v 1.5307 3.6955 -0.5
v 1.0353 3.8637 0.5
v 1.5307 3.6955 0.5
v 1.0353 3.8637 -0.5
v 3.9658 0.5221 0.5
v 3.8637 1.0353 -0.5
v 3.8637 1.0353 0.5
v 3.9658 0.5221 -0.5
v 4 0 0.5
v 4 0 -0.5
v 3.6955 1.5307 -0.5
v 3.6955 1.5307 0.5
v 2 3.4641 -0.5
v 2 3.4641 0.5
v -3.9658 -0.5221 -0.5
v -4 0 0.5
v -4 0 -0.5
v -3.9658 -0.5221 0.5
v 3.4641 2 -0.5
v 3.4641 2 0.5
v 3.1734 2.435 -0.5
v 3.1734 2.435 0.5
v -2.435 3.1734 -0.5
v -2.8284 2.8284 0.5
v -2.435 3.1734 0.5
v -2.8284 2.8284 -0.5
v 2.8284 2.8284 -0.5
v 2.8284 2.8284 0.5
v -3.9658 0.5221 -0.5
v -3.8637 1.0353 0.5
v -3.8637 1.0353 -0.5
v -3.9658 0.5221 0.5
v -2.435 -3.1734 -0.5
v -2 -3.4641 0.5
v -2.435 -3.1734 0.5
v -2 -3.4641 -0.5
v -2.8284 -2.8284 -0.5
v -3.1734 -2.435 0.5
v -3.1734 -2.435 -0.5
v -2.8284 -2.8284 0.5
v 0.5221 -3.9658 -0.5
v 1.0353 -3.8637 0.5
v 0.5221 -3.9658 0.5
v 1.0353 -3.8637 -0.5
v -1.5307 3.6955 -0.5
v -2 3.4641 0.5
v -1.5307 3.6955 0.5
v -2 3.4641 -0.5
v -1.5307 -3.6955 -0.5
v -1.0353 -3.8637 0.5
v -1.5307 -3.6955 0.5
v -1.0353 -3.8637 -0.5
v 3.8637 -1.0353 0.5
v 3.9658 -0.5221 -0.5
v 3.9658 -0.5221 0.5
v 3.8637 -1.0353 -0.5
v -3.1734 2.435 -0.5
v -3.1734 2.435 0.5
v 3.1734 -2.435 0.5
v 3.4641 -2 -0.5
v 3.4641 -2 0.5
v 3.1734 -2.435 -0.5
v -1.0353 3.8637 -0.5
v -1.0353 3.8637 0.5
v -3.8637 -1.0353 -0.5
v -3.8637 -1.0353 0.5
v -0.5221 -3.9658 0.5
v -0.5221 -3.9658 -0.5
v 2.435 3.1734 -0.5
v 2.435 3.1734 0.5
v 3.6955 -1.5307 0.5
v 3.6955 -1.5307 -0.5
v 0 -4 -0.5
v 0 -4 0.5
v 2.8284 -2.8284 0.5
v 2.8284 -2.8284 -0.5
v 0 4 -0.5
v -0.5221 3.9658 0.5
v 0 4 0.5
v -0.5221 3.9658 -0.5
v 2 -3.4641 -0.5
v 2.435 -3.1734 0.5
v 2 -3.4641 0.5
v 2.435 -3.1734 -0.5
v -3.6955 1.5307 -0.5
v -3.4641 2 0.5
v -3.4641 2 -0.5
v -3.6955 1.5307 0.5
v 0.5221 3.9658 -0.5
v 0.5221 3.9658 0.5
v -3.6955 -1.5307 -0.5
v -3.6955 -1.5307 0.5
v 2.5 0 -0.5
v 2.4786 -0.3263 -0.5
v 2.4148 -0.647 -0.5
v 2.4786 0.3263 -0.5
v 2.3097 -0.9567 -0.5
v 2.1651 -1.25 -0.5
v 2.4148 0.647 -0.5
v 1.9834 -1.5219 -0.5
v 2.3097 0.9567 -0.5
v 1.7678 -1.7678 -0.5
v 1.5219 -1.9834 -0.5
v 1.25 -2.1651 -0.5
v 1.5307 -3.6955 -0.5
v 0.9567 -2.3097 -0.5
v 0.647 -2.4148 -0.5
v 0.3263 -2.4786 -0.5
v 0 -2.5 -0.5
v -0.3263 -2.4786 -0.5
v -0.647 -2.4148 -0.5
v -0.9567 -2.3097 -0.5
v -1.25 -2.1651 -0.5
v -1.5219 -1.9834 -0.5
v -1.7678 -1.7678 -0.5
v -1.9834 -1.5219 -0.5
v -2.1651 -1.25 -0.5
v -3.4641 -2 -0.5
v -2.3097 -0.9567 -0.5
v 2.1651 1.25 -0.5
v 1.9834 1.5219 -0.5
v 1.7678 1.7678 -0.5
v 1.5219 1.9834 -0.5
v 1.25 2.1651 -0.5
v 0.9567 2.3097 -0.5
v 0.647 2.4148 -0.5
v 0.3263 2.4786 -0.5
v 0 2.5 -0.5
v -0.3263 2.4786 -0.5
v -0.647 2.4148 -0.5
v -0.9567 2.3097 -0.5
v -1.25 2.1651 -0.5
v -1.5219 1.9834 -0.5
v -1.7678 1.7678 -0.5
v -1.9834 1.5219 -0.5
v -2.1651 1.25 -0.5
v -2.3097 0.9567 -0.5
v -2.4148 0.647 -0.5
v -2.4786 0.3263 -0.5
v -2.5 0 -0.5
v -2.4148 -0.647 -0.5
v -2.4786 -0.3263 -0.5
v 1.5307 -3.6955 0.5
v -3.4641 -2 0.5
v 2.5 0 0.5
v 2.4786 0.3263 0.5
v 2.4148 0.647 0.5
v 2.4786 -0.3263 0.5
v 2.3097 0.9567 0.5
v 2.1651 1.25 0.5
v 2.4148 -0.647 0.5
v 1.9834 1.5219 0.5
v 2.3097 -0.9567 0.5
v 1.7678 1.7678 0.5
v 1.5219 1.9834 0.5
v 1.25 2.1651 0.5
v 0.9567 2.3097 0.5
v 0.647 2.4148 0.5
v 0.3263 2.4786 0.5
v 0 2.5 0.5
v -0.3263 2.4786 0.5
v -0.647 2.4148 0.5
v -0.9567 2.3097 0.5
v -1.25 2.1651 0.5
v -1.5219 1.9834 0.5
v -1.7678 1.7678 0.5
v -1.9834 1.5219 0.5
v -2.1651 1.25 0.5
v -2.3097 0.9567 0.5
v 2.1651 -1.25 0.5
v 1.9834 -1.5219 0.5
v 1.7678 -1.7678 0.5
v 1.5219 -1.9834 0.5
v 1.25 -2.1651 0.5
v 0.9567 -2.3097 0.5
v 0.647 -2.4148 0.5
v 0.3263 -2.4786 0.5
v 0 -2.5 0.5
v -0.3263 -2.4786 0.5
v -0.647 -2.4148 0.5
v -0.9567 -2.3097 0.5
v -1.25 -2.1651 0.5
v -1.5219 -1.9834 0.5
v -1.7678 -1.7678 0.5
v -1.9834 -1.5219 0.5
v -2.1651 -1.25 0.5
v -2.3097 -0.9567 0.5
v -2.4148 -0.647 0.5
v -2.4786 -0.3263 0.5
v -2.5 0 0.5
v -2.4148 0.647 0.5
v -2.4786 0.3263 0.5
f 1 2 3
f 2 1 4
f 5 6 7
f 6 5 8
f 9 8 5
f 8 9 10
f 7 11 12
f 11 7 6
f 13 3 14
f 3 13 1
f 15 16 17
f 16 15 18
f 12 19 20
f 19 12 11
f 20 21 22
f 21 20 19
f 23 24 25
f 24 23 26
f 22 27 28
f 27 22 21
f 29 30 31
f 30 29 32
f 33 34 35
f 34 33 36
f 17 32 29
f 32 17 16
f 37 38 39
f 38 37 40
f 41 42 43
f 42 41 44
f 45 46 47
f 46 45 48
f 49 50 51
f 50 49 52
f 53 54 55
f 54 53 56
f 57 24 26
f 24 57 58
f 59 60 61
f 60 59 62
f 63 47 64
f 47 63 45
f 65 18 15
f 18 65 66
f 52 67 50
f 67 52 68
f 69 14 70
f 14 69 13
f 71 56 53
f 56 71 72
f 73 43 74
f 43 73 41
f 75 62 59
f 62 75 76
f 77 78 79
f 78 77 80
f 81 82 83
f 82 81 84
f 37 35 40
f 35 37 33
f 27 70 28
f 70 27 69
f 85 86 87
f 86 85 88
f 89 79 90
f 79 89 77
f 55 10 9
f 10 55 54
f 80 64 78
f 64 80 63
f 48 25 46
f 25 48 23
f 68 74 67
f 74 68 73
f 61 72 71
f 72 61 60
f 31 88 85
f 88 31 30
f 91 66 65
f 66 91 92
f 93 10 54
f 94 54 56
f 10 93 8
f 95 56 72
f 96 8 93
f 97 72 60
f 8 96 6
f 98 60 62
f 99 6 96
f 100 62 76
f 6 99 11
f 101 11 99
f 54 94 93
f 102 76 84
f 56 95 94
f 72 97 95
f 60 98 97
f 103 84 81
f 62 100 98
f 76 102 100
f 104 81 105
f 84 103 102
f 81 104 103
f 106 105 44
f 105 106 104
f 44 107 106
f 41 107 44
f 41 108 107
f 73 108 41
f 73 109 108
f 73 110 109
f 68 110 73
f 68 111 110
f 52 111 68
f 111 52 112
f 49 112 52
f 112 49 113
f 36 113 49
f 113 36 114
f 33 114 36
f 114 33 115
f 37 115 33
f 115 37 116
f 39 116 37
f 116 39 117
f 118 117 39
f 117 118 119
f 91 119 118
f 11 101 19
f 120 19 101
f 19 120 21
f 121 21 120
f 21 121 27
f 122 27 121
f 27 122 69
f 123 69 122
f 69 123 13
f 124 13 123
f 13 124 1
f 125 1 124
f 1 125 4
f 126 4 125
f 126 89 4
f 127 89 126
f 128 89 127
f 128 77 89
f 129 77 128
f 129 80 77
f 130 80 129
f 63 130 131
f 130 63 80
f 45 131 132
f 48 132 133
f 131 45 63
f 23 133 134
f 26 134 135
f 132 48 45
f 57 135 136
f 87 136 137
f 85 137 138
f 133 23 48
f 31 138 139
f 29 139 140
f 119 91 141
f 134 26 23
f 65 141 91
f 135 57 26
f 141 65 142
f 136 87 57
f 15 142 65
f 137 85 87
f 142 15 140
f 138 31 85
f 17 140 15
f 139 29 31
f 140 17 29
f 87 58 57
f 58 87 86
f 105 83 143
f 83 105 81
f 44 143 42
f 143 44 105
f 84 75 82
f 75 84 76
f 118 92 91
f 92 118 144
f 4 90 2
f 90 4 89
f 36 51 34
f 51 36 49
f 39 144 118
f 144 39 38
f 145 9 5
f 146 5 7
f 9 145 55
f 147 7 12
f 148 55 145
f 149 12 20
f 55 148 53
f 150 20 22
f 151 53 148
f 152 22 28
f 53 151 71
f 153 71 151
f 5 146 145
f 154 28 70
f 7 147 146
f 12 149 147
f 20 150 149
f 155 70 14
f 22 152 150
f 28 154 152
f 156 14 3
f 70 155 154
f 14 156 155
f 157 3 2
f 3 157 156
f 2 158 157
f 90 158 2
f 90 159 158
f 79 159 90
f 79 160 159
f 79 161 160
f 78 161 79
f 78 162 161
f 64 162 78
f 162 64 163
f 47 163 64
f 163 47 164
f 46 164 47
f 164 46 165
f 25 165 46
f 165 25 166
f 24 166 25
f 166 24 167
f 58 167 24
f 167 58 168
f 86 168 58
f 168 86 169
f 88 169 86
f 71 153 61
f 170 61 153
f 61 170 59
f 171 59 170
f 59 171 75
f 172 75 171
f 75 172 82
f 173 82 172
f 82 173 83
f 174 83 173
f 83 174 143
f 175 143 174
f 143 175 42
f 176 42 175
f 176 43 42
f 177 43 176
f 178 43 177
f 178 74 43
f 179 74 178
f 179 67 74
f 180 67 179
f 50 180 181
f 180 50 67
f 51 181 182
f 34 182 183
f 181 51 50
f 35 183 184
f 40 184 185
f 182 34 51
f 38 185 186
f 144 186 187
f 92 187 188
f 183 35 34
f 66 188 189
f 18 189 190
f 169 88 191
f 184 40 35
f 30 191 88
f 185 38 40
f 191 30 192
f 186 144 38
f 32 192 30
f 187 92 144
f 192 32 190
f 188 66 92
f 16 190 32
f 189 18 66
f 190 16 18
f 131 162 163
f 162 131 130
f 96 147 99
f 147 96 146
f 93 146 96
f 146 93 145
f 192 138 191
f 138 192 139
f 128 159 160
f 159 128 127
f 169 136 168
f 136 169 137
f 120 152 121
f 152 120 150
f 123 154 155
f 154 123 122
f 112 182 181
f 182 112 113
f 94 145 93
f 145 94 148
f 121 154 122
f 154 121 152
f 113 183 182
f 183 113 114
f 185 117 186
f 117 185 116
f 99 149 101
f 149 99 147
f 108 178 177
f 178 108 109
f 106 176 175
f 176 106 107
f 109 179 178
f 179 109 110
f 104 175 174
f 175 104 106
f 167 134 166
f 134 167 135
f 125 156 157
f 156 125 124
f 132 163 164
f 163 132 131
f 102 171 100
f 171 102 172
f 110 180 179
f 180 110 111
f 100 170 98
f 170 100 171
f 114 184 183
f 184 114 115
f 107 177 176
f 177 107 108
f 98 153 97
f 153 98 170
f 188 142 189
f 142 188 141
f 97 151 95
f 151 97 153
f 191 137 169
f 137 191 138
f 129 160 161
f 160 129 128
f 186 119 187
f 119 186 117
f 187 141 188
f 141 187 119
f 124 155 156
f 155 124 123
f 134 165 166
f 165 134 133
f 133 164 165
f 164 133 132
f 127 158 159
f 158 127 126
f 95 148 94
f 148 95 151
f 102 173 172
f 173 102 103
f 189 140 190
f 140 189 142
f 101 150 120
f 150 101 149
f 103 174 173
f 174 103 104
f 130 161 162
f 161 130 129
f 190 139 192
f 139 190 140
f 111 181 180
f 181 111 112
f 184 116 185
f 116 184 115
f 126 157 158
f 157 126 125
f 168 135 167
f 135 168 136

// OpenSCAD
difference()
{
	cylinder(d=8,h=1,center=true,$fn=24*2);
	cylinder(d=5,h=1+0.2,center=true,$fn=24*2);
}
